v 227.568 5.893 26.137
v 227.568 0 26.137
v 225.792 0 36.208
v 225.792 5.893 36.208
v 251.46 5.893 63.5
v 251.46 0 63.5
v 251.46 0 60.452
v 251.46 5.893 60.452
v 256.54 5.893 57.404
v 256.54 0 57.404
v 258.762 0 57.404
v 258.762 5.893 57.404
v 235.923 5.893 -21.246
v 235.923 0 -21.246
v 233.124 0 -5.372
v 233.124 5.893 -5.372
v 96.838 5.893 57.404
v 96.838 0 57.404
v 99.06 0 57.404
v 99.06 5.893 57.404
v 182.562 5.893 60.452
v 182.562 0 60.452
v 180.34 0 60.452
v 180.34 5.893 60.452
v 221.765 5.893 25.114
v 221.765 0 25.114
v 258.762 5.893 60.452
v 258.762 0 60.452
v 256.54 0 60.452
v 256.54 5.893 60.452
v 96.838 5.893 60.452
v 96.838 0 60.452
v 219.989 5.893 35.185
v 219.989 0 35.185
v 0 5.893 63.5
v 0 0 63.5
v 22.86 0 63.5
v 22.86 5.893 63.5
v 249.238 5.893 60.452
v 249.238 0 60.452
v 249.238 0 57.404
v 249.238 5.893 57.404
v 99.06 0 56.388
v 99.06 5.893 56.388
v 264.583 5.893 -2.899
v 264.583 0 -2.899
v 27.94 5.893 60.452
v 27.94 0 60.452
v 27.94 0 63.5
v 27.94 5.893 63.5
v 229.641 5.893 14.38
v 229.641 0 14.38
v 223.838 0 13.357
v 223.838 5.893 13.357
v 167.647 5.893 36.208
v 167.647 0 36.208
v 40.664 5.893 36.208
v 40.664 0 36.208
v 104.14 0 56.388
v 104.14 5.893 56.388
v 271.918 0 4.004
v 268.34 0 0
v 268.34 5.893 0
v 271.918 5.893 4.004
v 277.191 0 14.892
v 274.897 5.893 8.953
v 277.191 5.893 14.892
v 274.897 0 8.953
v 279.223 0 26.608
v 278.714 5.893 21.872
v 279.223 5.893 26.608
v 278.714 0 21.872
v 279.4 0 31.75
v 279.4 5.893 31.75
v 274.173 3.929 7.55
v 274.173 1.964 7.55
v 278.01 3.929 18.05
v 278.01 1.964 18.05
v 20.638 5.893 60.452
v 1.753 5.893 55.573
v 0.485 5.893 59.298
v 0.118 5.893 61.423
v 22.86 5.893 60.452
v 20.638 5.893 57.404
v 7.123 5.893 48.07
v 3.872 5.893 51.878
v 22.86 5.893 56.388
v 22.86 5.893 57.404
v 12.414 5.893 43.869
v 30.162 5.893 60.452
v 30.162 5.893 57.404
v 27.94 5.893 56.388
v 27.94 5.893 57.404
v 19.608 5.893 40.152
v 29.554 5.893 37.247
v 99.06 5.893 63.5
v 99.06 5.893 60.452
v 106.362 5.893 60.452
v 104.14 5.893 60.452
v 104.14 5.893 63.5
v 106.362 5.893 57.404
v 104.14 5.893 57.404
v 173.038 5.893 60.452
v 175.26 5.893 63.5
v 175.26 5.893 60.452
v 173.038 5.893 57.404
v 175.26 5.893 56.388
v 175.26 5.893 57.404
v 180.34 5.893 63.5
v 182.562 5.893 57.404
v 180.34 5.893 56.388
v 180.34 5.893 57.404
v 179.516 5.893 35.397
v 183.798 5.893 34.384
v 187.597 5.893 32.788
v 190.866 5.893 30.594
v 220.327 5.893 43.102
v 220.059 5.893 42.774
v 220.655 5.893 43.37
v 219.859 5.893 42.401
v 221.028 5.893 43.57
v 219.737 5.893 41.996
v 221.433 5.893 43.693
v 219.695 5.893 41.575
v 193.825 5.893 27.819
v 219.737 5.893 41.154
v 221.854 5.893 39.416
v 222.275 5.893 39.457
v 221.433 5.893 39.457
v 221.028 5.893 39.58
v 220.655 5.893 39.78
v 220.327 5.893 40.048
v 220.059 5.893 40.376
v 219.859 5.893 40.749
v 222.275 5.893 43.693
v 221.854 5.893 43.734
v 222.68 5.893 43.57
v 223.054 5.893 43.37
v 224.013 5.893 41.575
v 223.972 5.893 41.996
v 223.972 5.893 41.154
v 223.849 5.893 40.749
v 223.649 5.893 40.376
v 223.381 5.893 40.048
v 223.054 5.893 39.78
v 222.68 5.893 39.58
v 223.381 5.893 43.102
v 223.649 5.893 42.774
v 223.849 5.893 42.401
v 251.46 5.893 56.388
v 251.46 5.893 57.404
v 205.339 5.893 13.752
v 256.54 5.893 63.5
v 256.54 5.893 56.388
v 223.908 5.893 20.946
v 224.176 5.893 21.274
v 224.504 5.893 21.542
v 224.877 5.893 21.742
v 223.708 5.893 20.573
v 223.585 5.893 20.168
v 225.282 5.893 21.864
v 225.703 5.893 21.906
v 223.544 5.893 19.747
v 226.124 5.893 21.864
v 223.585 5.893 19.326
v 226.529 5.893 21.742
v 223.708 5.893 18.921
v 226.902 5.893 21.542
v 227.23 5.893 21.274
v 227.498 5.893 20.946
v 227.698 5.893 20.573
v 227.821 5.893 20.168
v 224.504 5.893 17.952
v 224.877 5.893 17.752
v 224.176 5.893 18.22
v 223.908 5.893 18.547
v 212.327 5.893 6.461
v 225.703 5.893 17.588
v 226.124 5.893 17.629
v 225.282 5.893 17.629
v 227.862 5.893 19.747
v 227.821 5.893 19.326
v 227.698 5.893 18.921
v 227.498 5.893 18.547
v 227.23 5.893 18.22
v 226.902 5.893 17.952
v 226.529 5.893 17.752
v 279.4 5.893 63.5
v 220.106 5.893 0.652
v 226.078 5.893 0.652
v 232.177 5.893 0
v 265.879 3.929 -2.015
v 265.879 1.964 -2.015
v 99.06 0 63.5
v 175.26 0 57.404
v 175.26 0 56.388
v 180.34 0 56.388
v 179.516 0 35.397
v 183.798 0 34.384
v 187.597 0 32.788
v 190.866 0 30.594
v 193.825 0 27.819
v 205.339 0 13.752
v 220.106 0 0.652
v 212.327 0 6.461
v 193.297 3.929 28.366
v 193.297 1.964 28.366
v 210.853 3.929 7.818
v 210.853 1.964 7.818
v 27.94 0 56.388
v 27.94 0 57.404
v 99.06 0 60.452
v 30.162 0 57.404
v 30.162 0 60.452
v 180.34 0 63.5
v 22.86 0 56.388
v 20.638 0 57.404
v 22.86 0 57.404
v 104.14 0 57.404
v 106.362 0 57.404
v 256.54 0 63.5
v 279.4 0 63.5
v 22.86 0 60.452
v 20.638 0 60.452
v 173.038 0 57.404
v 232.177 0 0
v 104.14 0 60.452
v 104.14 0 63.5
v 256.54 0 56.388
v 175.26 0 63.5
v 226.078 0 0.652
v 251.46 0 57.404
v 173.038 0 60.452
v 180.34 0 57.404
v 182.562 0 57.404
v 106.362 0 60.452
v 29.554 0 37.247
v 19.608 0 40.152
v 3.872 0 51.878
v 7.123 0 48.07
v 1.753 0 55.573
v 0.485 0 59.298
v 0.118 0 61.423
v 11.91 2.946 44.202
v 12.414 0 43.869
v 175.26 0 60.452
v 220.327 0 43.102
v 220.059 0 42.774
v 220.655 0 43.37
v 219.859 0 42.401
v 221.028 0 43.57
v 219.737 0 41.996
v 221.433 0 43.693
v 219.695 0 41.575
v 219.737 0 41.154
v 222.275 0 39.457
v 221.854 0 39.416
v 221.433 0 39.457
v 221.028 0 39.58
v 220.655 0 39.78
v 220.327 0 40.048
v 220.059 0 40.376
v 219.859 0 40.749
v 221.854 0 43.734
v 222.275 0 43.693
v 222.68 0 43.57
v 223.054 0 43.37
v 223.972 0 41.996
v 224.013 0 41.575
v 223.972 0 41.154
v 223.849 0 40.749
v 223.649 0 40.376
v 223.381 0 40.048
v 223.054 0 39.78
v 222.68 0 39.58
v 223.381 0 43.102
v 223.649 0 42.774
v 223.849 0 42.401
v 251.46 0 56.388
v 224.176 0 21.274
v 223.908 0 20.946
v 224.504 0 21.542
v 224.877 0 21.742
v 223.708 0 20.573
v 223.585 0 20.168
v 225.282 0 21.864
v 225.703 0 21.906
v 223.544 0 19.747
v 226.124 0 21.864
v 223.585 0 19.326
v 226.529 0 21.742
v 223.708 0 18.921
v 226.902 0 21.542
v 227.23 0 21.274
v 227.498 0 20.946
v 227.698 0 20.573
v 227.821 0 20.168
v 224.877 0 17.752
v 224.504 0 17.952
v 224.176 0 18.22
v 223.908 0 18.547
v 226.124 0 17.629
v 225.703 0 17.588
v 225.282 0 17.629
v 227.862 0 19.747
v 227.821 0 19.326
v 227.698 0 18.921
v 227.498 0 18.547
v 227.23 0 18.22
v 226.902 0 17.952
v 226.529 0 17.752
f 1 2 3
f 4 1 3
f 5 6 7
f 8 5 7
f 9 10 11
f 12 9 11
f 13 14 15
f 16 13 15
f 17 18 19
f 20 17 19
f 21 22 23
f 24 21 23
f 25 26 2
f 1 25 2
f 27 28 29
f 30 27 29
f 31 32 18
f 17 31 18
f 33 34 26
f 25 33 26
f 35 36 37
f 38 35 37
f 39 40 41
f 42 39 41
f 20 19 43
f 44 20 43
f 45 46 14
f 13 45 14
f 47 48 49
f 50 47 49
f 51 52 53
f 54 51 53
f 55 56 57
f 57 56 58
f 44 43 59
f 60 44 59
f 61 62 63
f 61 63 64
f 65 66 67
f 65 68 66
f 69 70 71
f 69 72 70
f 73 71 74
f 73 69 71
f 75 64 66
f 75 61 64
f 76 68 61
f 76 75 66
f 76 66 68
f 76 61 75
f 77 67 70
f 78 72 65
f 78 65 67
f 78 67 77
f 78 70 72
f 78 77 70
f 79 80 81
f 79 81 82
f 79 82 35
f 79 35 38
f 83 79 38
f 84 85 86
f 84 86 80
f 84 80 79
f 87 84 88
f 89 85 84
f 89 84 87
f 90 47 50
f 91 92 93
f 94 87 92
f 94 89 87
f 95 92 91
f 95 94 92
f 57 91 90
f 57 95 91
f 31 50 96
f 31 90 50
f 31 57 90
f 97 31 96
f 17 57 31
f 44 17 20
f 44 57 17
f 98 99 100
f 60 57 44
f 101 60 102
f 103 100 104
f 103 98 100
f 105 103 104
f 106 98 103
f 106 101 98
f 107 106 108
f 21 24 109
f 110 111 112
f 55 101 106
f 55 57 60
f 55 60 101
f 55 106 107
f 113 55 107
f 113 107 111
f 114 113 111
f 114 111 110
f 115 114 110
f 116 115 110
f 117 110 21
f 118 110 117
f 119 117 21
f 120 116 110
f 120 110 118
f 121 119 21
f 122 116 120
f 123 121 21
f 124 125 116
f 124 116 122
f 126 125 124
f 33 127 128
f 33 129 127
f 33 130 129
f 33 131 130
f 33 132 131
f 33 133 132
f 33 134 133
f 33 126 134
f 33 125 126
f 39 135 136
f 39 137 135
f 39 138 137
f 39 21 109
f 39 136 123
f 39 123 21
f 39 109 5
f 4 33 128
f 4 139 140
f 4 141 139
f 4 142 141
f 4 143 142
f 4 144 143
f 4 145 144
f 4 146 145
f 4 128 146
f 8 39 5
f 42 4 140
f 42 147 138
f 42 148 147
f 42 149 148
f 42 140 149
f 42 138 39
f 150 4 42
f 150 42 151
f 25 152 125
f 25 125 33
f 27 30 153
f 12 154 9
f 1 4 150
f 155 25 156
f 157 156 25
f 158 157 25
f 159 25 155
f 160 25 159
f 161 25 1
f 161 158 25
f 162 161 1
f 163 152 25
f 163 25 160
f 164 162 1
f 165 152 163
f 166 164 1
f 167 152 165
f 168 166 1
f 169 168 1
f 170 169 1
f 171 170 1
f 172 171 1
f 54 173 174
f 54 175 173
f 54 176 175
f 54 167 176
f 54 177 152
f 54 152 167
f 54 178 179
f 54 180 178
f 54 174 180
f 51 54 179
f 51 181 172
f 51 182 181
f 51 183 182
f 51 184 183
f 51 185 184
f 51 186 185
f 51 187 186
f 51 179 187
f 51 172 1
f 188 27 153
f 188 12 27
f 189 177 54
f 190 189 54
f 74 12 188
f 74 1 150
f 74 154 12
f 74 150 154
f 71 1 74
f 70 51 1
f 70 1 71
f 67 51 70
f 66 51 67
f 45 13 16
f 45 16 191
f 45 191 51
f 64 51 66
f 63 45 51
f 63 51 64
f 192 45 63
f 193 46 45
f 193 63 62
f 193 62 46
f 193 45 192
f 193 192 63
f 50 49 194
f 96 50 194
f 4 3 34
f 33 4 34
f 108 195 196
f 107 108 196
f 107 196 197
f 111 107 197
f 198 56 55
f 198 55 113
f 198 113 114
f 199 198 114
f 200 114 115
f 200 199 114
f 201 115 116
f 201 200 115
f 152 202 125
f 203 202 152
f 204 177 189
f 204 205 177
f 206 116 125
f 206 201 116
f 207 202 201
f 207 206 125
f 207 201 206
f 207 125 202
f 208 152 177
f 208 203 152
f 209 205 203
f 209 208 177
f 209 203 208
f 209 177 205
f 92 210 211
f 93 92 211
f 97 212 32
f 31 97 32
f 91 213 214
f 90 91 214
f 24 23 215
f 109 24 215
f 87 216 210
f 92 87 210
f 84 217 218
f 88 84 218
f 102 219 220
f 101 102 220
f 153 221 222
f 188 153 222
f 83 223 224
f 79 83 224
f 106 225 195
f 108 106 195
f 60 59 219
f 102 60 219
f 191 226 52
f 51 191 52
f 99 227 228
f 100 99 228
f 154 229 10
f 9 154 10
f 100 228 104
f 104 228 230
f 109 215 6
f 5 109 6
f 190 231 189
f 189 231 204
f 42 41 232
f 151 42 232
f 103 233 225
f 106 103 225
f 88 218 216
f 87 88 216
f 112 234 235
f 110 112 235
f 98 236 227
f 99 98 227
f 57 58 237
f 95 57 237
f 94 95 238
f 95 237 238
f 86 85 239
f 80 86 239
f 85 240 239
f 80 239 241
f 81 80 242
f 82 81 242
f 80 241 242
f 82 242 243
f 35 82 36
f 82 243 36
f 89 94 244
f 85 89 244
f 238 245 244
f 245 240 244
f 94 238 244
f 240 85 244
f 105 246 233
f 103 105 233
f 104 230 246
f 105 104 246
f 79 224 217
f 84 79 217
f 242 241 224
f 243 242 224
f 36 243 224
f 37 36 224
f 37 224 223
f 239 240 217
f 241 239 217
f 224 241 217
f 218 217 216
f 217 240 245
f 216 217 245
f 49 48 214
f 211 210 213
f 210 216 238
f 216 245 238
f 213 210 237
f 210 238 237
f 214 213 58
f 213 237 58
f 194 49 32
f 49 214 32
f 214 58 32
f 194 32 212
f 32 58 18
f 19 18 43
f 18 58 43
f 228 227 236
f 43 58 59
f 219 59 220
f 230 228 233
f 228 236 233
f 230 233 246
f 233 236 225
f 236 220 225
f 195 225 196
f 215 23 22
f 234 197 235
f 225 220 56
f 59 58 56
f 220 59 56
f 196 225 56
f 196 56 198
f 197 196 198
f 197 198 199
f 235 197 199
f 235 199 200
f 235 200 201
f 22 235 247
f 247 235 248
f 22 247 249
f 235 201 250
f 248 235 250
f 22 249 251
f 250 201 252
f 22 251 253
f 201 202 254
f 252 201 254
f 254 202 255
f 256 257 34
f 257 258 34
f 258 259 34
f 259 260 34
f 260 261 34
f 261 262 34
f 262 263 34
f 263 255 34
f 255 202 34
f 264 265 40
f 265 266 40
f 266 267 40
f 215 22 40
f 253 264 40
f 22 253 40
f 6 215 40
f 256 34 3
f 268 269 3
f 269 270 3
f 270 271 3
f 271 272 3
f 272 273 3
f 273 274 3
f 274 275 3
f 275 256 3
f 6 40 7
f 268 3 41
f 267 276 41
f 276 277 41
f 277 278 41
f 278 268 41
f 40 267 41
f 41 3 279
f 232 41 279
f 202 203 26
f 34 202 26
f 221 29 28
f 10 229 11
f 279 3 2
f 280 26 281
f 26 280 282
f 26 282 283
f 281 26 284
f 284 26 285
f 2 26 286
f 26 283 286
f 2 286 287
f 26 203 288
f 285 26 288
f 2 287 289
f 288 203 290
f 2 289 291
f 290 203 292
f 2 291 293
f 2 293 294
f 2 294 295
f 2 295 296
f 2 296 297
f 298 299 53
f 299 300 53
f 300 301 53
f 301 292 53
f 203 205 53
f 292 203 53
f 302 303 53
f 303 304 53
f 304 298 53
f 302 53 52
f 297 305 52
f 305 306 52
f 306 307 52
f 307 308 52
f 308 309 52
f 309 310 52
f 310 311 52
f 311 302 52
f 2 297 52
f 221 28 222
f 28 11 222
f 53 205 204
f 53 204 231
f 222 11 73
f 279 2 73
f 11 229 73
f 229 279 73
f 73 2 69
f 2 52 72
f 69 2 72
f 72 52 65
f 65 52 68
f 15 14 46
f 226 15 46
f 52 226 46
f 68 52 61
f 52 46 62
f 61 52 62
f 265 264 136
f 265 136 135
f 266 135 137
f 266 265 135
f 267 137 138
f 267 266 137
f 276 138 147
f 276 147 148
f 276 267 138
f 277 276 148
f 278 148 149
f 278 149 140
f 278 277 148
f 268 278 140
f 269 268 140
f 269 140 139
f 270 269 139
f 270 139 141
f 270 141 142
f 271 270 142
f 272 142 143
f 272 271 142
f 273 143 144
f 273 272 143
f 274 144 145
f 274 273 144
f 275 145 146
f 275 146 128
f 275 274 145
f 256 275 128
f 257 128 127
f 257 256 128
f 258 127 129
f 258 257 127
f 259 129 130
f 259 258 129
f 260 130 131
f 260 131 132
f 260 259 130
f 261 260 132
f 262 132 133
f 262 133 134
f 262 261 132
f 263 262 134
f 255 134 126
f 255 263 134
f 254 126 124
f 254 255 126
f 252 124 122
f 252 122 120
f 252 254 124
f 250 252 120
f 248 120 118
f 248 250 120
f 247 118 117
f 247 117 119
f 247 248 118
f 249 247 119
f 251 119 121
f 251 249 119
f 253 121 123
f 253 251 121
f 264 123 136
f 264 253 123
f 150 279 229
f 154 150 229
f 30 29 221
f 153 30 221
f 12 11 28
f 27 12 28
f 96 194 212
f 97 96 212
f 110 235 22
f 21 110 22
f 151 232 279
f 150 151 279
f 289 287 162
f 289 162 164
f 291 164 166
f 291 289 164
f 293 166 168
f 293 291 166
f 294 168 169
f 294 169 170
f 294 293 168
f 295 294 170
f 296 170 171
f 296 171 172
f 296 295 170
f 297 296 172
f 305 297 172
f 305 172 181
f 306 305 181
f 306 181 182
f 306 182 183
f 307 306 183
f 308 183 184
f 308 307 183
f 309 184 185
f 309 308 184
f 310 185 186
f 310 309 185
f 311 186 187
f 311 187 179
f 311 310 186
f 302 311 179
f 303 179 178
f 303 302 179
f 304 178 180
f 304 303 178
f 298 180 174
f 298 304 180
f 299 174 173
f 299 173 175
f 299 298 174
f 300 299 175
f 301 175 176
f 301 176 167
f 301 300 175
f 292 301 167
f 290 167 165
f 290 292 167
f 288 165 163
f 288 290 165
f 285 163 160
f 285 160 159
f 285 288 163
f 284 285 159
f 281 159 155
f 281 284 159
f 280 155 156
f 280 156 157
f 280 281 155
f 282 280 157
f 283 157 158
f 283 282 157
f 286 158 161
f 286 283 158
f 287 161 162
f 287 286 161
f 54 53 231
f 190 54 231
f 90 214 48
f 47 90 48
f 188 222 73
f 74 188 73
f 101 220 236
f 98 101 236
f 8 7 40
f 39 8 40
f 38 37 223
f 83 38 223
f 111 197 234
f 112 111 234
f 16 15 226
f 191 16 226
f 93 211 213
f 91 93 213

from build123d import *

# Parameters (mm, degrees)
SKETCH1_R           = 2.159
BOSS_EXTRUDE1_DEPTH = 5.8928


with BuildPart() as part:
    # Sketch1 → Boss-Extrude1 (new body)
    # profile 1 of 3: a face of its own
    with BuildSketch(Plane(origin=(0, 0, 0), x_dir=(1, 0, 0), z_dir=(0, 1, 0))):
        with BuildLine():
            Line((22.86, -56.388), (25.4, -56.388))
            Line((25.4, -56.388), (27.94, -56.388))
            Line((27.94, -56.388), (27.94, -57.404))
            Line((27.94, -57.404), (30.1625, -57.404))
            Line((30.1625, -57.404), (30.1625, -60.452))
            Line((30.1625, -60.452), (27.94, -60.452))
            Line((27.94, -60.452), (27.94, -63.5))
            Line((27.94, -63.5), (99.06, -63.5))
            Line((99.06, -63.5), (99.06, -60.452))
            Line((99.06, -60.452), (96.8375, -60.452))
            Line((96.8375, -60.452), (96.8375, -57.404))
            Line((96.8375, -57.404), (99.06, -57.404))
            Line((99.06, -57.404), (99.06, -56.388))
            Line((99.06, -56.388), (101.6, -56.388))
            Line((101.6, -56.388), (104.14, -56.388))
            Line((104.14, -56.388), (104.14, -57.404))
            Line((104.14, -57.404), (106.3625, -57.404))
            Line((106.3625, -57.404), (106.3625, -60.452))
            Line((106.3625, -60.452), (104.14, -60.452))
            Line((104.14, -60.452), (104.14, -63.5))
            Line((104.14, -63.5), (175.26, -63.5))
            Line((175.26, -63.5), (175.26, -60.452))
            Line((175.26, -60.452), (173.0375, -60.452))
            Line((173.0375, -60.452), (173.0375, -57.404))
            Line((173.0375, -57.404), (175.26, -57.404))
            Line((175.26, -57.404), (175.26, -56.388))
            Line((175.26, -56.388), (177.8, -56.388))
            Line((177.8, -56.388), (180.34, -56.388))
            Line((180.34, -56.388), (180.34, -57.404))
            Line((180.34, -57.404), (182.5625, -57.404))
            Line((182.5625, -57.404), (182.5625, -60.452))
            Line((182.5625, -60.452), (180.34, -60.452))
            Line((180.34, -60.452), (180.34, -63.5))
            Line((180.34, -63.5), (251.46, -63.5))
            Line((251.46, -63.5), (251.46, -60.452))
            Line((251.46, -60.452), (249.2375, -60.452))
            Line((249.2375, -60.452), (249.2375, -57.404))
            Line((249.2375, -57.404), (251.46, -57.404))
            Line((251.46, -57.404), (251.46, -56.388))
            Line((251.46, -56.388), (254, -56.388))
            Line((254, -56.388), (256.54, -56.388))
            Line((256.54, -56.388), (256.54, -57.404))
            Line((256.54, -57.404), (258.7625, -57.404))
            Line((258.7625, -57.404), (258.7625, -60.452))
            Line((258.7625, -60.452), (256.54, -60.452))
            Line((256.54, -60.452), (256.54, -63.5))
            Line((256.54, -63.5), (279.4, -63.5))
            Line((279.4, -63.5), (279.4, -31.75))
            add(Edge.make_bspline(
                [(268.339603776, 0), (275.019525549, -6.158991848), (279.385214725, -16.365397032), (279.4, -31.75)],
                knots=[0.805473307, 0.805473307, 0.805473307, 0.805473307, 1, 1, 1, 1], degree=3))
            Line((268.339603776, 0), (232.176763275, 0))
            Line((232.176763275, 0), (229.641134322, -14.380266384))
            Line((229.641134322, -14.380266384), (223.837859195, -13.356992403))
            Line((223.837859195, -13.356992403), (226.078012822, -0.652449861))
            Line((226.078012822, -0.652449861), (220.106261854, -0.652449861))
            add(Edge.make_bspline(
                [(167.647045609, -36.208320755), (182.540854706, -36.177050532), (193.471525933, -31.320671219), (205.978352833, -11.056890294), (216.80246247, -2.714612362), (220.106261854, -0.652449861)],
                knots=[0, 0, 0, 0, 0.18449289, 0.370391028, 0.445681017, 0.445681017, 0.445681017, 0.445681017], degree=3))
            Line((167.647045609, -36.208320755), (40.664262654, -36.208320755))
            add(Edge.make_bspline(
                [(40.664262654, -36.208320755), (0, -36.208320755), (0, -63.5)],
                knots=[1.570796327, 1.570796327, 1.570796327, 3.141592654, 3.141592654, 3.141592654], degree=2, weights=[1, 0.707106781, 1]))
            Line((0, -63.5), (22.86, -63.5))
            Line((22.86, -63.5), (22.86, -60.452))
            Line((22.86, -60.452), (20.6375, -60.452))
            Line((20.6375, -60.452), (20.6375, -57.404))
            Line((20.6375, -57.404), (22.86, -57.404))
            Line((22.86, -57.404), (22.86, -56.388))
        make_face()
        with Locations(Location((221.854115864, -41.575001242, 0), (0, 0, 270))):
            Circle(SKETCH1_R, mode=Mode.SUBTRACT)
        Polygon((221.76484725, -25.113627358), (227.568122377, -26.13690134), (225.7922594, -36.208320755), (219.988984273, -35.185046774), align=None, mode=Mode.SUBTRACT)
        with Locations(Location((225.702990786, -19.746946871, 0), (0, 0, 270))):
            Circle(SKETCH1_R, mode=Mode.SUBTRACT)
    # profile 2 of 3: a face of its own
    with BuildSketch(Plane(origin=(0, 0, 0), x_dir=(1, 0, 0), z_dir=(0, 1, 0))):
        with BuildLine():
            Line((233.123919707, 5.371591052), (232.176763275, 0))
            Line((232.176763275, 0), (268.339603776, 0))
            add(Edge.make_bspline(
                [(264.58250195, 2.898755616), (265.899962004, 2.055359977), (267.156104906, 1.091204379), (268.339603776, 0)],
                knots=[0.771008514, 0.771008514, 0.771008514, 0.771008514, 0.805473307, 0.805473307, 0.805473307, 0.805473307], degree=3))
            add(Edge.make_bspline(
                [(233.123919707, 5.371591052), (239.398286694, 7.344939742), (250.719959286, 8.655748308), (260.759413307, 5.346174252), (264.58250195, 2.898755616)],
                knots=[0.539626218, 0.539626218, 0.539626218, 0.539626218, 0.670996405, 0.771008514, 0.771008514, 0.771008514, 0.771008514], degree=3))
        make_face()
    # profile 3 of 3: a face of its own
    with BuildSketch(Plane(origin=(0, 0, 0), x_dir=(1, 0, 0), z_dir=(0, 1, 0))):
        with BuildLine():
            Line((235.922949985, 21.245680584), (233.123919707, 5.371591052))
            add(Edge.make_bspline(
                [(233.123919707, 5.371591052), (239.398286694, 7.344939742), (250.719959286, 8.655748308), (260.759413307, 5.346174252), (264.58250195, 2.898755616)],
                knots=[0.539626218, 0.539626218, 0.539626218, 0.539626218, 0.670996405, 0.771008514, 0.771008514, 0.771008514, 0.771008514], degree=3))
            Line((264.58250195, 2.898755616), (235.922949985, 21.245680584))
        make_face()
    extrude(amount=BOSS_EXTRUDE1_DEPTH)


solid = part.part
